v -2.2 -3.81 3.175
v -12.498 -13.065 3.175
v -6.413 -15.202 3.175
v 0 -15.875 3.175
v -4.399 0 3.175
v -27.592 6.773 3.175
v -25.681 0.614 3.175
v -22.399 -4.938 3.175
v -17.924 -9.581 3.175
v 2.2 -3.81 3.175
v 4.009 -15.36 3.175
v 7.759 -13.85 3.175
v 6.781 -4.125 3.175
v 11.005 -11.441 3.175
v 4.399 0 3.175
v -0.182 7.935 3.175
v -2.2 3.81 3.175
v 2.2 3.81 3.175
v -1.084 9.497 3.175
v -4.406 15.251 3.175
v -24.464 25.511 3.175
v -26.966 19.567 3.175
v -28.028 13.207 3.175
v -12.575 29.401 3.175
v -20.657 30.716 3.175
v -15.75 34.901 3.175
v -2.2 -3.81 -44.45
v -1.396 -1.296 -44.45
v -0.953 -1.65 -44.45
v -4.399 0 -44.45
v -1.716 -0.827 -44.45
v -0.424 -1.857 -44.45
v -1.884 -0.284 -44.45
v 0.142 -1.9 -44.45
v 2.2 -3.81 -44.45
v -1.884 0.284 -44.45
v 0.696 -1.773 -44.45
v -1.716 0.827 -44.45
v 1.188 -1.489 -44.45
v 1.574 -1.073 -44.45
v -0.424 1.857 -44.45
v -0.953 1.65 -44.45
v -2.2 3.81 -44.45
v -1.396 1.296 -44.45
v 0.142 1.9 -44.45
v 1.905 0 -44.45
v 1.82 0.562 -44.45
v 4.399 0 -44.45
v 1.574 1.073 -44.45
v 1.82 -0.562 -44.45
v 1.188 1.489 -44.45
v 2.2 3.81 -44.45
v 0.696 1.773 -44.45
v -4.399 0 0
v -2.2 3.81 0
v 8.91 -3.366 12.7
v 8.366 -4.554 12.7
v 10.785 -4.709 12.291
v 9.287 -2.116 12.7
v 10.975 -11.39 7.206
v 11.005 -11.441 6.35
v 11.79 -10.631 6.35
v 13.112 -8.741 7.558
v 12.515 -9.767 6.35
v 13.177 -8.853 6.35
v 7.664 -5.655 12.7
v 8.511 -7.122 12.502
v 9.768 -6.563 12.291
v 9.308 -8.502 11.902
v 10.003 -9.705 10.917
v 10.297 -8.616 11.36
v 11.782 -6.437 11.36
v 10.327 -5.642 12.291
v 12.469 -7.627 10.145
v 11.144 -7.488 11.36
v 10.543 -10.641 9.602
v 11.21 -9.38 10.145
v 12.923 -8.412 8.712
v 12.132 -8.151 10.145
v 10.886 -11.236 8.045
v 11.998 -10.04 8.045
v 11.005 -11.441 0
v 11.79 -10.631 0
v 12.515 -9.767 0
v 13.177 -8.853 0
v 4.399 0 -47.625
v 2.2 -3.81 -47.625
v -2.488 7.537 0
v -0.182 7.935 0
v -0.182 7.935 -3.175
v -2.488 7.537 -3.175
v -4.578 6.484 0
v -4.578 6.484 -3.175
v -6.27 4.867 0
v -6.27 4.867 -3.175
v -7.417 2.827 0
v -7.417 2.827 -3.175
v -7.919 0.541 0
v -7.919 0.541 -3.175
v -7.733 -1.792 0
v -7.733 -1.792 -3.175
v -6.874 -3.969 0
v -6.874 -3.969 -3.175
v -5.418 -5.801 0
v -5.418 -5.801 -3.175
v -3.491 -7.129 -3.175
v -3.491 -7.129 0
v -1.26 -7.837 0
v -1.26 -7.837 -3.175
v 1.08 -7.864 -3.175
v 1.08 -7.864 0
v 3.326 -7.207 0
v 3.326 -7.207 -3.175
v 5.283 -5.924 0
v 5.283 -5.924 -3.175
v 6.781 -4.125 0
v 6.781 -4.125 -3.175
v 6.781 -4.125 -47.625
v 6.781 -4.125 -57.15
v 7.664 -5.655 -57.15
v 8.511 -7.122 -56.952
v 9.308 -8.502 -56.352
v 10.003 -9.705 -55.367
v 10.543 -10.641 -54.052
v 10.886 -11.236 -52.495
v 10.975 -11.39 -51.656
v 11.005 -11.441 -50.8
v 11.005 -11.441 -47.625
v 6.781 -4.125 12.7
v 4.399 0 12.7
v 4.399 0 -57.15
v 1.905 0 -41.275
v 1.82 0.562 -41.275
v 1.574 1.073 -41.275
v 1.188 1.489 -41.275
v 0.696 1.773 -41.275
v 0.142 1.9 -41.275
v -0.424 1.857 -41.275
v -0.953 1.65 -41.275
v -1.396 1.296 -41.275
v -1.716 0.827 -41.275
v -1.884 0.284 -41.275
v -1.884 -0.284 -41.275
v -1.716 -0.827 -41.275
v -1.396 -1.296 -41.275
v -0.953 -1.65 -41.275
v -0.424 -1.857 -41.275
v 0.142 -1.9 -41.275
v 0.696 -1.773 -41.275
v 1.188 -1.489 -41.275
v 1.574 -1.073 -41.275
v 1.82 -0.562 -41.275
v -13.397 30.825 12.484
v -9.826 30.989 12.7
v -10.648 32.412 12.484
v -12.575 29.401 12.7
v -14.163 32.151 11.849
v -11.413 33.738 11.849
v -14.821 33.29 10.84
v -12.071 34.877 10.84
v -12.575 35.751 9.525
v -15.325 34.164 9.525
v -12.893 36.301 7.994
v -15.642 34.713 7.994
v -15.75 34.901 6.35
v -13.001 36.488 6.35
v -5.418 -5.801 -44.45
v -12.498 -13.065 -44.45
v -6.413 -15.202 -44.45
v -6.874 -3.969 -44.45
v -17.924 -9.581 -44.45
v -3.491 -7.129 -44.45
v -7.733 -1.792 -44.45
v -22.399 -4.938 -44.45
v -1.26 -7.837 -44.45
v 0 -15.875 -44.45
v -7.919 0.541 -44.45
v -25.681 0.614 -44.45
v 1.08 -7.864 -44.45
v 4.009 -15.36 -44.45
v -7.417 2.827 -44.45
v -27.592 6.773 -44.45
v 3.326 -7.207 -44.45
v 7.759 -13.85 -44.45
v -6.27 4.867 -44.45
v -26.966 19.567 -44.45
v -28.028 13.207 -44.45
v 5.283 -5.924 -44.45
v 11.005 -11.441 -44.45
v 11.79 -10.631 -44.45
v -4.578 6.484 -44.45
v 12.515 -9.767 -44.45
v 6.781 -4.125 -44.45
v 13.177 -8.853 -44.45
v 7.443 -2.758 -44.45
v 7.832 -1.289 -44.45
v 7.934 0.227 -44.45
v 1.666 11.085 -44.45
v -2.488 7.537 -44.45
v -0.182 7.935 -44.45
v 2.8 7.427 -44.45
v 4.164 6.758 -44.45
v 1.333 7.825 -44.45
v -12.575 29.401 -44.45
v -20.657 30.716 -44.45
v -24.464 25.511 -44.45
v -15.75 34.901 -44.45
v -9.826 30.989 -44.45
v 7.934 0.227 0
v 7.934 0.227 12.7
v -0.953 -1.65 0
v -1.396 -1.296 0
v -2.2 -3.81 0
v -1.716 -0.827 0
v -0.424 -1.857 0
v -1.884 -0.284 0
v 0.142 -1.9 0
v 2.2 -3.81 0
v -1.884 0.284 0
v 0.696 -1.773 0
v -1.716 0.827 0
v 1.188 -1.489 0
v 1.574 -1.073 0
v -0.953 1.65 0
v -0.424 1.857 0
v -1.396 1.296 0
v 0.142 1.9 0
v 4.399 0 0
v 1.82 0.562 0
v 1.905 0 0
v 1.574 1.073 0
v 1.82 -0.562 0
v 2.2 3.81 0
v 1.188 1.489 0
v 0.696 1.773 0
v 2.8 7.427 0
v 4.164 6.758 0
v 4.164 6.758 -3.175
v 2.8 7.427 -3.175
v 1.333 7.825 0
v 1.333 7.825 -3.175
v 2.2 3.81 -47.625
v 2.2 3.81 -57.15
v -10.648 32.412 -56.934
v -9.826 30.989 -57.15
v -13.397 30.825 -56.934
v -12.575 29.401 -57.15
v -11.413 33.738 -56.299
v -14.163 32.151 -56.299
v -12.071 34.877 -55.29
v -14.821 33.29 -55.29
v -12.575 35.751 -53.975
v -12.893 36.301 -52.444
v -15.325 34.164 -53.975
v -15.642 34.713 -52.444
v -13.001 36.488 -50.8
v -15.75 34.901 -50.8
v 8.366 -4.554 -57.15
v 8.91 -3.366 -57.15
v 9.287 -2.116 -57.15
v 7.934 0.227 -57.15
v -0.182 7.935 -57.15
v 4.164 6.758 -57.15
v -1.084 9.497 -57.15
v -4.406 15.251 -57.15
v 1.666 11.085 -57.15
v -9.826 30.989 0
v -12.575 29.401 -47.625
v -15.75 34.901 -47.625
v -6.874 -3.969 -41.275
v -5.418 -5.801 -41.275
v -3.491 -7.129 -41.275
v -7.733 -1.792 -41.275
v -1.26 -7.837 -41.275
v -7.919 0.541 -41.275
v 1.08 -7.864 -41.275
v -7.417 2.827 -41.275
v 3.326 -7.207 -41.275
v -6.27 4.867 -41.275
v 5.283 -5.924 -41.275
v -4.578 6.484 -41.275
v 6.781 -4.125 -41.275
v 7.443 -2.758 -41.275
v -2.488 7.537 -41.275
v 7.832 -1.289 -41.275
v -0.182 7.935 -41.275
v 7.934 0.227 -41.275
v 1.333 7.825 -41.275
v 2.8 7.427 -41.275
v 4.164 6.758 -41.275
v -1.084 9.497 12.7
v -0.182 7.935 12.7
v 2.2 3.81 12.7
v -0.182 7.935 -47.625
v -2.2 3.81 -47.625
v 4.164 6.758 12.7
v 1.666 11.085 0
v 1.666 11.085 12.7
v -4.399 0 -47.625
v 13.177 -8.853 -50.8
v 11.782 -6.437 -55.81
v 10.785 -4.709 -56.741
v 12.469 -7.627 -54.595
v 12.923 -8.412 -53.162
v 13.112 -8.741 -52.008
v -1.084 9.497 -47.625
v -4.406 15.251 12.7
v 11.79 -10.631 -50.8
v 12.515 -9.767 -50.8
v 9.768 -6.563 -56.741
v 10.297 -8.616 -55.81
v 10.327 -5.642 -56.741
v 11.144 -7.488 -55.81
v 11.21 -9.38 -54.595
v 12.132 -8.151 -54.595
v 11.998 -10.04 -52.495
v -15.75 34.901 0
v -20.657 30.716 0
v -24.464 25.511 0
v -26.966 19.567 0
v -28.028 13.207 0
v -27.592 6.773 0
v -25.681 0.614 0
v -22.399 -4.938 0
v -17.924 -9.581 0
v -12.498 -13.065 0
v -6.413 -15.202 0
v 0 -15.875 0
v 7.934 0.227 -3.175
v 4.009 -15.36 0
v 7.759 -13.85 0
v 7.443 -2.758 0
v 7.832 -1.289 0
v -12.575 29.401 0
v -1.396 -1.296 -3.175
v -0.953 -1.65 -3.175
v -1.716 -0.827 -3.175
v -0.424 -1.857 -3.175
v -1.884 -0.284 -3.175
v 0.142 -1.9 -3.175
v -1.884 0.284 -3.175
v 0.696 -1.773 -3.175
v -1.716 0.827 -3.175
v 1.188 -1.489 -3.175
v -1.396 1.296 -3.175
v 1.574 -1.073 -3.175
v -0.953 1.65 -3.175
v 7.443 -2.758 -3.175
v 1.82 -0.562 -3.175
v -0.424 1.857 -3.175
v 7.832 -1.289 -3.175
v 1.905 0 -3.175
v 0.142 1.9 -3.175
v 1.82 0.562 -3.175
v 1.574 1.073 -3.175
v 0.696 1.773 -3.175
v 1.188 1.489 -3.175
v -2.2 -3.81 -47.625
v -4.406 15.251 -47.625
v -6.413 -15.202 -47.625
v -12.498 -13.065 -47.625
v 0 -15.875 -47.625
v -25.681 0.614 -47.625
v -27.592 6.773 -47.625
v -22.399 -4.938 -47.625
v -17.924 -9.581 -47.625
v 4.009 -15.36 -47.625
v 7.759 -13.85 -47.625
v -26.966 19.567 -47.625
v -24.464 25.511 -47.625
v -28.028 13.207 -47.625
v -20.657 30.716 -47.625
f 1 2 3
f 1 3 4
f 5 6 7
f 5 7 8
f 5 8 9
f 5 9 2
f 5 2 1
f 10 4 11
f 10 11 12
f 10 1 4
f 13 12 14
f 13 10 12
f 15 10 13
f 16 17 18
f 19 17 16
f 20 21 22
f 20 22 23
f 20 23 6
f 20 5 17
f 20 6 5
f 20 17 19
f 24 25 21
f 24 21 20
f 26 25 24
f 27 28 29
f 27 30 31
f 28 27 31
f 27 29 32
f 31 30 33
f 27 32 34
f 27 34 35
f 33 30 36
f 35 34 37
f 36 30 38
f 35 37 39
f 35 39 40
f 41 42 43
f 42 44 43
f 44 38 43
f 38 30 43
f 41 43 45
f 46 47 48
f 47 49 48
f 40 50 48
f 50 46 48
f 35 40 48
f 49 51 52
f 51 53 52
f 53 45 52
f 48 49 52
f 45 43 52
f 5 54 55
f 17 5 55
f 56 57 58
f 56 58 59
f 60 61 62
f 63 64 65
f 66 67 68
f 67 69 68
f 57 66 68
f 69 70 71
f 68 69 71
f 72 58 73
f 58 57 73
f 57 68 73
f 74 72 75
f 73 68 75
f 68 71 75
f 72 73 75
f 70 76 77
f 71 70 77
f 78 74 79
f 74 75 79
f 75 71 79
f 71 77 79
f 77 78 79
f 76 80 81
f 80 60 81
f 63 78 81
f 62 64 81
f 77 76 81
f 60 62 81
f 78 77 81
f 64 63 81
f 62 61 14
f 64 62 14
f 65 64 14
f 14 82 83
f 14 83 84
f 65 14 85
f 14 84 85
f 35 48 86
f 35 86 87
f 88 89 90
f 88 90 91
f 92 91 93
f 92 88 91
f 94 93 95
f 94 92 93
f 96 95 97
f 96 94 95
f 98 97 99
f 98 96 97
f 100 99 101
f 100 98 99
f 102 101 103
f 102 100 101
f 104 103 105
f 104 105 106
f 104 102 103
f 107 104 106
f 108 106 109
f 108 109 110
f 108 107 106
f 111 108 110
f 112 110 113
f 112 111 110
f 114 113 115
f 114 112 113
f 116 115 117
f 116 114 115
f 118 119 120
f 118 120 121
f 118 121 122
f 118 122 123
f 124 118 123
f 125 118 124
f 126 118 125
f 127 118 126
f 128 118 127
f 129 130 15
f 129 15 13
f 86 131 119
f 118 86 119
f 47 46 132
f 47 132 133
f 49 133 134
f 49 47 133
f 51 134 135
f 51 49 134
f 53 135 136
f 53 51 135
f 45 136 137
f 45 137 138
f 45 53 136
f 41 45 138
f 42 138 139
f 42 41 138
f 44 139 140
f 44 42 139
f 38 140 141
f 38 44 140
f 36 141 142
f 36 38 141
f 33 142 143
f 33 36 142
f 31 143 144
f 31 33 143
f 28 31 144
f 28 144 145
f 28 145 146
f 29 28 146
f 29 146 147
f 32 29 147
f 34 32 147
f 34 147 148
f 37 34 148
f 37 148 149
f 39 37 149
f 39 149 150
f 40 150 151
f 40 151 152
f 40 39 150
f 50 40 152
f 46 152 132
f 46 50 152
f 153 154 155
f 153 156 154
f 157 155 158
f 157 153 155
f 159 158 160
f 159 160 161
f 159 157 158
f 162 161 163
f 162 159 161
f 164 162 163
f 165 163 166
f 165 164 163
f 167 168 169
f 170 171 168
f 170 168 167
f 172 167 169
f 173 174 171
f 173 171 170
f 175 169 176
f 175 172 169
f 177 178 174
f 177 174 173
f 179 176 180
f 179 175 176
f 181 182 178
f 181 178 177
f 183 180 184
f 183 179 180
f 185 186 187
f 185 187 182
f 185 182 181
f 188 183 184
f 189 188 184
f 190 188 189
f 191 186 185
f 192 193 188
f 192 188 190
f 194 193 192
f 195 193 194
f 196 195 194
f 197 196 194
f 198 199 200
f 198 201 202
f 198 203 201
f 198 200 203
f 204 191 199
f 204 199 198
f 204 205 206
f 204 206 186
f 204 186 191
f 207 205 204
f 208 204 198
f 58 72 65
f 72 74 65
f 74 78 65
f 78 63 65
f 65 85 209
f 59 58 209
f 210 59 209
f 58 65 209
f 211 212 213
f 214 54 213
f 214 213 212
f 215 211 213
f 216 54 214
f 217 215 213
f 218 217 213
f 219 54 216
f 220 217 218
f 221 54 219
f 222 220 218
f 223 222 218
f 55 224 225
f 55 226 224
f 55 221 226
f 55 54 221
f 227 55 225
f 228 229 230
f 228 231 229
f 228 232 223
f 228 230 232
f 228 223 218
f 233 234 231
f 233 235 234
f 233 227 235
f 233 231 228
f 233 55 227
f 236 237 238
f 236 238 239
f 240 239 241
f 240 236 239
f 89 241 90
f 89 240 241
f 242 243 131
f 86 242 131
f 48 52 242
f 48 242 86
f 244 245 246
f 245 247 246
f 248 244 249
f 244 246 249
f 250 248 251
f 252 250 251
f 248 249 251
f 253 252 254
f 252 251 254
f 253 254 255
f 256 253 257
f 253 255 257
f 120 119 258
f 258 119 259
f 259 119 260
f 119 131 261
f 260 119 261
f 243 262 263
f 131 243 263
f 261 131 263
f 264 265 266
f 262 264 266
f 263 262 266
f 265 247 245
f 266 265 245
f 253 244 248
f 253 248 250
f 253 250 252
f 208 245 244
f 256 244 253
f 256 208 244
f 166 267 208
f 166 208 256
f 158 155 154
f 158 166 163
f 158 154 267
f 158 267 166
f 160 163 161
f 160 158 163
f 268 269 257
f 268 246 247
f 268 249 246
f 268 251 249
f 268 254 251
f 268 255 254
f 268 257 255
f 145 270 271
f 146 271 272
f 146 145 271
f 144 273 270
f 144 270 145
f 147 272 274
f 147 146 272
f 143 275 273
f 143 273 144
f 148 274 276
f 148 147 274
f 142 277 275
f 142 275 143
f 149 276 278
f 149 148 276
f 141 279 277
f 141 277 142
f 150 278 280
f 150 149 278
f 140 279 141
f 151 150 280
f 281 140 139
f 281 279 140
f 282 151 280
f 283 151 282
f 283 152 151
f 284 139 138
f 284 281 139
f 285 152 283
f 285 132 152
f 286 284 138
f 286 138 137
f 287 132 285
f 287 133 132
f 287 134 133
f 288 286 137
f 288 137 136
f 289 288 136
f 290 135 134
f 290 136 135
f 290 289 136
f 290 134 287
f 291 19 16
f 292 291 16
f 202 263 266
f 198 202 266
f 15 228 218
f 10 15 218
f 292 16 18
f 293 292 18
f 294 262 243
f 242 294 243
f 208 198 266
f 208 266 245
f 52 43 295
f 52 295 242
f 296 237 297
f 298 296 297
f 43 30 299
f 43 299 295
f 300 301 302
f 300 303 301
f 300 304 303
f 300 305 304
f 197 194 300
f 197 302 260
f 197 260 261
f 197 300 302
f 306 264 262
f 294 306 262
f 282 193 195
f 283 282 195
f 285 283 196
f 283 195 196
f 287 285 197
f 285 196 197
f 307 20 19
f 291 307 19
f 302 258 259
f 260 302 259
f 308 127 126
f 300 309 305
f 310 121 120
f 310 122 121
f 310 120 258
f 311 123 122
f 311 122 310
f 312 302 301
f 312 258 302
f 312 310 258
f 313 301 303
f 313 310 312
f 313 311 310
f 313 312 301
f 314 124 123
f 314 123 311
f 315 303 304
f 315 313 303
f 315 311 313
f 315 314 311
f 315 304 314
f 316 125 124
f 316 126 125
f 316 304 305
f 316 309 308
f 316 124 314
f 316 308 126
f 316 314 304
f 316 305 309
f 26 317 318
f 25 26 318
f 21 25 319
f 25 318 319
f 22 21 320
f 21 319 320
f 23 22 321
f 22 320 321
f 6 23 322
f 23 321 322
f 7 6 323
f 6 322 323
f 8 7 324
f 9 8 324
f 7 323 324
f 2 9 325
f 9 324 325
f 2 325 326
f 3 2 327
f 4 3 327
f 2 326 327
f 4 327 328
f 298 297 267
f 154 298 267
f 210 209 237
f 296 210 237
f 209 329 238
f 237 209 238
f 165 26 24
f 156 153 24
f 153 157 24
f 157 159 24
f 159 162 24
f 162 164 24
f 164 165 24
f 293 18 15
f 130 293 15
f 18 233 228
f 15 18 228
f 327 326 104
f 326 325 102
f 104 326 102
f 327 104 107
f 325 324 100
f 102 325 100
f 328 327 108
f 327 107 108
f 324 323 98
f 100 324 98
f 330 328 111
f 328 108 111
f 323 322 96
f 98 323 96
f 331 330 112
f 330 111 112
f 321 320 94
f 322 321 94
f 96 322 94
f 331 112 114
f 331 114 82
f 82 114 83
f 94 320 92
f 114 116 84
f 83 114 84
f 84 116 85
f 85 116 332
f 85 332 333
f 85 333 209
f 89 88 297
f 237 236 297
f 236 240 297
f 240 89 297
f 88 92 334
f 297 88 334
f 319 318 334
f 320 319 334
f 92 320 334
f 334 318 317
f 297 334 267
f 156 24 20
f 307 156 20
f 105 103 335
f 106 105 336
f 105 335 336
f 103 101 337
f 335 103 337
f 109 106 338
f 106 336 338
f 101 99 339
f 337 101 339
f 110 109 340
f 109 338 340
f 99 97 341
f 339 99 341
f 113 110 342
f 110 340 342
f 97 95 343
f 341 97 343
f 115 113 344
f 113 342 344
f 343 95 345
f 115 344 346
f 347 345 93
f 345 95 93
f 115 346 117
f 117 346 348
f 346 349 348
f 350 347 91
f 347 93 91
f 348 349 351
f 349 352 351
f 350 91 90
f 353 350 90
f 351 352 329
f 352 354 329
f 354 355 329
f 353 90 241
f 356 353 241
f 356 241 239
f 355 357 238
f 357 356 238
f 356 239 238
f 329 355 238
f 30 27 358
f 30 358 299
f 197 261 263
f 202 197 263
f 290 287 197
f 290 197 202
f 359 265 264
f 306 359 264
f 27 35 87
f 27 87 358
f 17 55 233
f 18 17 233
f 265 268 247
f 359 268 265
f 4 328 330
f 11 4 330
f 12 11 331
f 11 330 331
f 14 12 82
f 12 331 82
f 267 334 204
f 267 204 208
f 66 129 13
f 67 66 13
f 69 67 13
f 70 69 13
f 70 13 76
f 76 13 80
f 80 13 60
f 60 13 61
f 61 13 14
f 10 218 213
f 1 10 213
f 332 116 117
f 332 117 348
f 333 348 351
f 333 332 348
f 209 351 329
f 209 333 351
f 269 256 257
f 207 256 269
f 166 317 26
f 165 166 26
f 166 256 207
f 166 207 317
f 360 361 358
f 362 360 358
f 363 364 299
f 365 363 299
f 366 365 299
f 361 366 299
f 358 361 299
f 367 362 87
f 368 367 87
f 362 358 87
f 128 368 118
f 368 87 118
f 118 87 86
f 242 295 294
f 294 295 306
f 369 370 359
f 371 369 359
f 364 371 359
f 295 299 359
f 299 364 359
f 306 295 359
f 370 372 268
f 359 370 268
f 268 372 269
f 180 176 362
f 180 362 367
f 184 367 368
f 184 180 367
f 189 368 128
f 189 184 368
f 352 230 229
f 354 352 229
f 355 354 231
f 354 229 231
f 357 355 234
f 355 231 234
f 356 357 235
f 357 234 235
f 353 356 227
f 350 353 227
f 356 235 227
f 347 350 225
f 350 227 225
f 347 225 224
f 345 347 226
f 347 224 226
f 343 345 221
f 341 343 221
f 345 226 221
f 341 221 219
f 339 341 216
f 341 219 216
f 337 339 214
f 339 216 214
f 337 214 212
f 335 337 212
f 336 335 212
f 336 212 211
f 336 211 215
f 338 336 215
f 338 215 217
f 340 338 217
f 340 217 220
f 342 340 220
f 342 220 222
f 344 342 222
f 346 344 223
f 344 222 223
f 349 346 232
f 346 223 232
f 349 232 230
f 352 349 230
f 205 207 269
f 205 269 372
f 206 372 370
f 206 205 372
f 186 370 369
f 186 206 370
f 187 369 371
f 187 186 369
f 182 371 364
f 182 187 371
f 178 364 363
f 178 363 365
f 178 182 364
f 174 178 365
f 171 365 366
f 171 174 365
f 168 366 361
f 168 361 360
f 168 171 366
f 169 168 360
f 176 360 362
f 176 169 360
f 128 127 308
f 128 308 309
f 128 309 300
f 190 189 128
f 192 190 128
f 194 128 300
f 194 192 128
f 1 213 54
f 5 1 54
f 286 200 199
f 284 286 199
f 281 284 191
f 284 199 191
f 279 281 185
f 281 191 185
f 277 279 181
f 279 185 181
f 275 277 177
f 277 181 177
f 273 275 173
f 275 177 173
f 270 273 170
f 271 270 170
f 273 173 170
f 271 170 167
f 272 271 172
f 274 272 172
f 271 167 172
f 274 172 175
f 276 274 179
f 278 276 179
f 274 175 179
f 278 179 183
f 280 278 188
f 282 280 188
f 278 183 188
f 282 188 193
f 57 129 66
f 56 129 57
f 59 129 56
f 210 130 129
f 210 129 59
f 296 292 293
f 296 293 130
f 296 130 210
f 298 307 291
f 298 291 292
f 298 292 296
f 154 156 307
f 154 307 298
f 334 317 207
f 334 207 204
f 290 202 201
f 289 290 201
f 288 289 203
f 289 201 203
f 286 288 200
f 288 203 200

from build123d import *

# Parameters (mm, degrees)
F0_R     = 1.905
F1_DEPTH = 3.175
F2_DEPTH = 3.175
F3_DEPTH = 12.7
F5_DEPTH = 9.525
F6_R     = 6.35
F9_DEPTH = 44.45


with BuildPart() as f1:
    # F0 (on Top) → F1 (new body)
    with BuildSketch(Plane.XY):
        with BuildLine():
            Line((2.1997045256, 3.81), (-0.1821025232, 7.9354108224))
            ThreePointArc((-0.1821025232, 7.9354108224), (-6.8740766425, -3.96875), (6.7812161001, -4.1254108224))
            Line((6.7812161001, -4.1254108224), (4.3994090512, 0))
            Line((4.3994090512, 0), (2.1997045256, -3.81))
            Line((2.1997045256, -3.81), (-2.1997045256, -3.81))
            Line((-2.1997045256, -3.81), (-4.3994090512, 0))
            Line((-4.3994090512, 0), (-2.1997045256, 3.81))
            Line((-2.1997045256, 3.81), (2.1997045256, 3.81))
        make_face()
        with BuildLine():
            ThreePointArc((4.1641356391, 6.7575055034), (2.0762977072, 7.6611287733), (-0.1821025232, 7.9354108224))
            Line((-0.1821025232, 7.9354108224), (2.1997045256, 3.81))
            Line((2.1997045256, 3.81), (4.3994090512, 0))
            Line((4.3994090512, 0), (6.7812161001, -4.1254108224))
            ThreePointArc((6.7812161001, -4.1254108224), (7.672880993, -2.0324378264), (7.9342392518, 0.2274944966))
            Line((7.9342392518, 0.2274944966), (4.1641356391, 6.7575055034))
        make_face()
        Polygon((4.3994090512, 0), (2.1997045256, 3.81), (-2.1997045256, 3.81), (-4.3994090512, 0), (-2.1997045256, -3.81), (2.1997045256, -3.81), align=None)
        Circle(F0_R, mode=Mode.SUBTRACT)
    extrude(amount=-F1_DEPTH)

    # F0 (on Top) → F2 (join)
    with BuildSketch(Plane.XY):
        with BuildLine():
            Line((-1.0837612628, 9.4971295705), (-4.4059530098, 15.2513344687))
            ThreePointArc((-4.4059530098, 15.2513344687), (-15.7183103368, -2.2249371126), (0, -15.875))
            ThreePointArc((0, -15.875), (5.9323031071, -14.7249246125), (11.0050665866, -11.4413344687))
            Line((11.0050665866, -11.4413344687), (6.7812161001, -4.1254108224))
            ThreePointArc((6.7812161001, -4.1254108224), (-6.8740766425, -3.96875), (-0.1821025232, 7.9354108224))
            Line((-0.1821025232, 7.9354108224), (-1.0837612628, 9.4971295705))
        make_face()
        Polygon((-12.5754425904, 29.4013054943), (-4.4059530098, 15.2513344687), (-1.0837612628, 9.4971295705), (1.6658693942, 11.0846295705), (-9.8258119334, 30.9888054943), align=None)
        with BuildLine():
            ThreePointArc((0, -15.875), (-15.7183103368, -2.2249371126), (-4.4059530098, 15.2513344687))
            Line((-4.4059530098, 15.2513344687), (-12.5754425904, 29.4013054943))
            Line((-12.5754425904, 29.4013054943), (-15.7504425904, 34.9005668084))
            ThreePointArc((-15.7504425904, 34.9005668084), (-26.8159478457, 3.6374215932), (0, -15.875))
        make_face()
        with BuildLine():
            Line((1.6658693942, 11.0846295705), (-1.0837612628, 9.4971295705))
            Line((-1.0837612628, 9.4971295705), (-0.1821025232, 7.9354108224))
            ThreePointArc((-0.1821025232, 7.9354108224), (2.0762977072, 7.6611287733), (4.1641356391, 6.7575055034))
            Line((4.1641356391, 6.7575055034), (1.6658693942, 11.0846295705))
        make_face()
        Polygon((-15.7504425904, 34.9005668084), (-12.5754425904, 29.4013054943), (-9.8258119334, 30.9888054943), (-13.0008119334, 36.4880668084), align=None)
        with BuildLine():
            Line((6.7812161001, -4.1254108224), (11.0050665866, -11.4413344687))
            ThreePointArc((11.0050665866, -11.4413344687), (12.1601025371, -10.2052697803), (13.1770447672, -8.8533110305))
            Line((13.1770447672, -8.8533110305), (7.9342392518, 0.2274944966))
            ThreePointArc((7.9342392518, 0.2274944966), (7.672880993, -2.0324378264), (6.7812161001, -4.1254108224))
        make_face()
        with BuildLine():
            ThreePointArc((4.1641356391, 6.7575055034), (2.0762977072, 7.6611287733), (-0.1821025232, 7.9354108224))
            Line((-0.1821025232, 7.9354108224), (2.1997045256, 3.81))
            Line((2.1997045256, 3.81), (4.3994090512, 0))
            Line((4.3994090512, 0), (6.7812161001, -4.1254108224))
            ThreePointArc((6.7812161001, -4.1254108224), (7.672880993, -2.0324378264), (7.9342392518, 0.2274944966))
            Line((7.9342392518, 0.2274944966), (4.1641356391, 6.7575055034))
        make_face()
        with BuildLine():
            Line((2.1997045256, 3.81), (-0.1821025232, 7.9354108224))
            ThreePointArc((-0.1821025232, 7.9354108224), (-6.8740766425, -3.96875), (6.7812161001, -4.1254108224))
            Line((6.7812161001, -4.1254108224), (4.3994090512, 0))
            Line((4.3994090512, 0), (2.1997045256, -3.81))
            Line((2.1997045256, -3.81), (-2.1997045256, -3.81))
            Line((-2.1997045256, -3.81), (-4.3994090512, 0))
            Line((-4.3994090512, 0), (-2.1997045256, 3.81))
            Line((-2.1997045256, 3.81), (2.1997045256, 3.81))
        make_face()
    extrude(amount=F2_DEPTH)

    # F0 (on Top) → F3 (join)
    with BuildSketch(Plane.XY):
        with BuildLine():
            Line((6.7812161001, -4.1254108224), (11.0050665866, -11.4413344687))
            ThreePointArc((11.0050665866, -11.4413344687), (12.1601025371, -10.2052697803), (13.1770447672, -8.8533110305))
            Line((13.1770447672, -8.8533110305), (7.9342392518, 0.2274944966))
            ThreePointArc((7.9342392518, 0.2274944966), (7.672880993, -2.0324378264), (6.7812161001, -4.1254108224))
        make_face()
        with BuildLine():
            Line((1.6658693942, 11.0846295705), (-1.0837612628, 9.4971295705))
            Line((-1.0837612628, 9.4971295705), (-0.1821025232, 7.9354108224))
            ThreePointArc((-0.1821025232, 7.9354108224), (2.0762977072, 7.6611287733), (4.1641356391, 6.7575055034))
            Line((4.1641356391, 6.7575055034), (1.6658693942, 11.0846295705))
        make_face()
        Polygon((-12.5754425904, 29.4013054943), (-4.4059530098, 15.2513344687), (-1.0837612628, 9.4971295705), (1.6658693942, 11.0846295705), (-9.8258119334, 30.9888054943), align=None)
        Polygon((-15.7504425904, 34.9005668084), (-12.5754425904, 29.4013054943), (-9.8258119334, 30.9888054943), (-13.0008119334, 36.4880668084), align=None)
    extrude(amount=F3_DEPTH)

    # F4 (on face) → F5 (join)
    with BuildSketch(Plane.XY.offset(3.175)):
        with BuildLine():
            Line((4.3994090512, 0), (6.7812161001, -4.1254108224))
            ThreePointArc((6.7812161001, -4.1254108224), (7.672880993, -2.0324378264), (7.9342392518, 0.2274944966))
            Line((7.9342392518, 0.2274944966), (4.1641356391, 6.7575055034))
            ThreePointArc((4.1641356391, 6.7575055034), (2.0762977072, 7.6611287733), (-0.1821025232, 7.9354108224))
            Line((-0.1821025232, 7.9354108224), (2.1997045256, 3.81))
            Line((2.1997045256, 3.81), (4.3994090512, 0))
        make_face()
    extrude(amount=F5_DEPTH)

    # F6
    f6_edges = [f1.edges().sort_by_distance(p)[0] for p in [
        (-14.375627, 35.694317, 12.7),
        (12.160103, -10.20527, 12.7),
    ]]
    fillet(f6_edges, radius=F6_R)


with BuildPart() as f8_1:
    # F8: instance of F1
    add(f1.part.mirror(Plane(origin=(-0.1702882742, -0.0983159809, -22.225), x_dir=(1, 0, 0), z_dir=(0, 0, -1))))


with BuildPart() as f1_1:
    add(f1.part)

    add(f8_1.part)  # F9 merges F8_1
    # F0 (on Top) → F9 (join, through all)
    with BuildSketch(Plane.XY):
        Polygon((-15.7504425904, 34.9005668084), (-12.5754425904, 29.4013054943), (-9.8258119334, 30.9888054943), (-13.0008119334, 36.4880668084), align=None)
    extrude(amount=-F9_DEPTH)


solid = f1_1.part
